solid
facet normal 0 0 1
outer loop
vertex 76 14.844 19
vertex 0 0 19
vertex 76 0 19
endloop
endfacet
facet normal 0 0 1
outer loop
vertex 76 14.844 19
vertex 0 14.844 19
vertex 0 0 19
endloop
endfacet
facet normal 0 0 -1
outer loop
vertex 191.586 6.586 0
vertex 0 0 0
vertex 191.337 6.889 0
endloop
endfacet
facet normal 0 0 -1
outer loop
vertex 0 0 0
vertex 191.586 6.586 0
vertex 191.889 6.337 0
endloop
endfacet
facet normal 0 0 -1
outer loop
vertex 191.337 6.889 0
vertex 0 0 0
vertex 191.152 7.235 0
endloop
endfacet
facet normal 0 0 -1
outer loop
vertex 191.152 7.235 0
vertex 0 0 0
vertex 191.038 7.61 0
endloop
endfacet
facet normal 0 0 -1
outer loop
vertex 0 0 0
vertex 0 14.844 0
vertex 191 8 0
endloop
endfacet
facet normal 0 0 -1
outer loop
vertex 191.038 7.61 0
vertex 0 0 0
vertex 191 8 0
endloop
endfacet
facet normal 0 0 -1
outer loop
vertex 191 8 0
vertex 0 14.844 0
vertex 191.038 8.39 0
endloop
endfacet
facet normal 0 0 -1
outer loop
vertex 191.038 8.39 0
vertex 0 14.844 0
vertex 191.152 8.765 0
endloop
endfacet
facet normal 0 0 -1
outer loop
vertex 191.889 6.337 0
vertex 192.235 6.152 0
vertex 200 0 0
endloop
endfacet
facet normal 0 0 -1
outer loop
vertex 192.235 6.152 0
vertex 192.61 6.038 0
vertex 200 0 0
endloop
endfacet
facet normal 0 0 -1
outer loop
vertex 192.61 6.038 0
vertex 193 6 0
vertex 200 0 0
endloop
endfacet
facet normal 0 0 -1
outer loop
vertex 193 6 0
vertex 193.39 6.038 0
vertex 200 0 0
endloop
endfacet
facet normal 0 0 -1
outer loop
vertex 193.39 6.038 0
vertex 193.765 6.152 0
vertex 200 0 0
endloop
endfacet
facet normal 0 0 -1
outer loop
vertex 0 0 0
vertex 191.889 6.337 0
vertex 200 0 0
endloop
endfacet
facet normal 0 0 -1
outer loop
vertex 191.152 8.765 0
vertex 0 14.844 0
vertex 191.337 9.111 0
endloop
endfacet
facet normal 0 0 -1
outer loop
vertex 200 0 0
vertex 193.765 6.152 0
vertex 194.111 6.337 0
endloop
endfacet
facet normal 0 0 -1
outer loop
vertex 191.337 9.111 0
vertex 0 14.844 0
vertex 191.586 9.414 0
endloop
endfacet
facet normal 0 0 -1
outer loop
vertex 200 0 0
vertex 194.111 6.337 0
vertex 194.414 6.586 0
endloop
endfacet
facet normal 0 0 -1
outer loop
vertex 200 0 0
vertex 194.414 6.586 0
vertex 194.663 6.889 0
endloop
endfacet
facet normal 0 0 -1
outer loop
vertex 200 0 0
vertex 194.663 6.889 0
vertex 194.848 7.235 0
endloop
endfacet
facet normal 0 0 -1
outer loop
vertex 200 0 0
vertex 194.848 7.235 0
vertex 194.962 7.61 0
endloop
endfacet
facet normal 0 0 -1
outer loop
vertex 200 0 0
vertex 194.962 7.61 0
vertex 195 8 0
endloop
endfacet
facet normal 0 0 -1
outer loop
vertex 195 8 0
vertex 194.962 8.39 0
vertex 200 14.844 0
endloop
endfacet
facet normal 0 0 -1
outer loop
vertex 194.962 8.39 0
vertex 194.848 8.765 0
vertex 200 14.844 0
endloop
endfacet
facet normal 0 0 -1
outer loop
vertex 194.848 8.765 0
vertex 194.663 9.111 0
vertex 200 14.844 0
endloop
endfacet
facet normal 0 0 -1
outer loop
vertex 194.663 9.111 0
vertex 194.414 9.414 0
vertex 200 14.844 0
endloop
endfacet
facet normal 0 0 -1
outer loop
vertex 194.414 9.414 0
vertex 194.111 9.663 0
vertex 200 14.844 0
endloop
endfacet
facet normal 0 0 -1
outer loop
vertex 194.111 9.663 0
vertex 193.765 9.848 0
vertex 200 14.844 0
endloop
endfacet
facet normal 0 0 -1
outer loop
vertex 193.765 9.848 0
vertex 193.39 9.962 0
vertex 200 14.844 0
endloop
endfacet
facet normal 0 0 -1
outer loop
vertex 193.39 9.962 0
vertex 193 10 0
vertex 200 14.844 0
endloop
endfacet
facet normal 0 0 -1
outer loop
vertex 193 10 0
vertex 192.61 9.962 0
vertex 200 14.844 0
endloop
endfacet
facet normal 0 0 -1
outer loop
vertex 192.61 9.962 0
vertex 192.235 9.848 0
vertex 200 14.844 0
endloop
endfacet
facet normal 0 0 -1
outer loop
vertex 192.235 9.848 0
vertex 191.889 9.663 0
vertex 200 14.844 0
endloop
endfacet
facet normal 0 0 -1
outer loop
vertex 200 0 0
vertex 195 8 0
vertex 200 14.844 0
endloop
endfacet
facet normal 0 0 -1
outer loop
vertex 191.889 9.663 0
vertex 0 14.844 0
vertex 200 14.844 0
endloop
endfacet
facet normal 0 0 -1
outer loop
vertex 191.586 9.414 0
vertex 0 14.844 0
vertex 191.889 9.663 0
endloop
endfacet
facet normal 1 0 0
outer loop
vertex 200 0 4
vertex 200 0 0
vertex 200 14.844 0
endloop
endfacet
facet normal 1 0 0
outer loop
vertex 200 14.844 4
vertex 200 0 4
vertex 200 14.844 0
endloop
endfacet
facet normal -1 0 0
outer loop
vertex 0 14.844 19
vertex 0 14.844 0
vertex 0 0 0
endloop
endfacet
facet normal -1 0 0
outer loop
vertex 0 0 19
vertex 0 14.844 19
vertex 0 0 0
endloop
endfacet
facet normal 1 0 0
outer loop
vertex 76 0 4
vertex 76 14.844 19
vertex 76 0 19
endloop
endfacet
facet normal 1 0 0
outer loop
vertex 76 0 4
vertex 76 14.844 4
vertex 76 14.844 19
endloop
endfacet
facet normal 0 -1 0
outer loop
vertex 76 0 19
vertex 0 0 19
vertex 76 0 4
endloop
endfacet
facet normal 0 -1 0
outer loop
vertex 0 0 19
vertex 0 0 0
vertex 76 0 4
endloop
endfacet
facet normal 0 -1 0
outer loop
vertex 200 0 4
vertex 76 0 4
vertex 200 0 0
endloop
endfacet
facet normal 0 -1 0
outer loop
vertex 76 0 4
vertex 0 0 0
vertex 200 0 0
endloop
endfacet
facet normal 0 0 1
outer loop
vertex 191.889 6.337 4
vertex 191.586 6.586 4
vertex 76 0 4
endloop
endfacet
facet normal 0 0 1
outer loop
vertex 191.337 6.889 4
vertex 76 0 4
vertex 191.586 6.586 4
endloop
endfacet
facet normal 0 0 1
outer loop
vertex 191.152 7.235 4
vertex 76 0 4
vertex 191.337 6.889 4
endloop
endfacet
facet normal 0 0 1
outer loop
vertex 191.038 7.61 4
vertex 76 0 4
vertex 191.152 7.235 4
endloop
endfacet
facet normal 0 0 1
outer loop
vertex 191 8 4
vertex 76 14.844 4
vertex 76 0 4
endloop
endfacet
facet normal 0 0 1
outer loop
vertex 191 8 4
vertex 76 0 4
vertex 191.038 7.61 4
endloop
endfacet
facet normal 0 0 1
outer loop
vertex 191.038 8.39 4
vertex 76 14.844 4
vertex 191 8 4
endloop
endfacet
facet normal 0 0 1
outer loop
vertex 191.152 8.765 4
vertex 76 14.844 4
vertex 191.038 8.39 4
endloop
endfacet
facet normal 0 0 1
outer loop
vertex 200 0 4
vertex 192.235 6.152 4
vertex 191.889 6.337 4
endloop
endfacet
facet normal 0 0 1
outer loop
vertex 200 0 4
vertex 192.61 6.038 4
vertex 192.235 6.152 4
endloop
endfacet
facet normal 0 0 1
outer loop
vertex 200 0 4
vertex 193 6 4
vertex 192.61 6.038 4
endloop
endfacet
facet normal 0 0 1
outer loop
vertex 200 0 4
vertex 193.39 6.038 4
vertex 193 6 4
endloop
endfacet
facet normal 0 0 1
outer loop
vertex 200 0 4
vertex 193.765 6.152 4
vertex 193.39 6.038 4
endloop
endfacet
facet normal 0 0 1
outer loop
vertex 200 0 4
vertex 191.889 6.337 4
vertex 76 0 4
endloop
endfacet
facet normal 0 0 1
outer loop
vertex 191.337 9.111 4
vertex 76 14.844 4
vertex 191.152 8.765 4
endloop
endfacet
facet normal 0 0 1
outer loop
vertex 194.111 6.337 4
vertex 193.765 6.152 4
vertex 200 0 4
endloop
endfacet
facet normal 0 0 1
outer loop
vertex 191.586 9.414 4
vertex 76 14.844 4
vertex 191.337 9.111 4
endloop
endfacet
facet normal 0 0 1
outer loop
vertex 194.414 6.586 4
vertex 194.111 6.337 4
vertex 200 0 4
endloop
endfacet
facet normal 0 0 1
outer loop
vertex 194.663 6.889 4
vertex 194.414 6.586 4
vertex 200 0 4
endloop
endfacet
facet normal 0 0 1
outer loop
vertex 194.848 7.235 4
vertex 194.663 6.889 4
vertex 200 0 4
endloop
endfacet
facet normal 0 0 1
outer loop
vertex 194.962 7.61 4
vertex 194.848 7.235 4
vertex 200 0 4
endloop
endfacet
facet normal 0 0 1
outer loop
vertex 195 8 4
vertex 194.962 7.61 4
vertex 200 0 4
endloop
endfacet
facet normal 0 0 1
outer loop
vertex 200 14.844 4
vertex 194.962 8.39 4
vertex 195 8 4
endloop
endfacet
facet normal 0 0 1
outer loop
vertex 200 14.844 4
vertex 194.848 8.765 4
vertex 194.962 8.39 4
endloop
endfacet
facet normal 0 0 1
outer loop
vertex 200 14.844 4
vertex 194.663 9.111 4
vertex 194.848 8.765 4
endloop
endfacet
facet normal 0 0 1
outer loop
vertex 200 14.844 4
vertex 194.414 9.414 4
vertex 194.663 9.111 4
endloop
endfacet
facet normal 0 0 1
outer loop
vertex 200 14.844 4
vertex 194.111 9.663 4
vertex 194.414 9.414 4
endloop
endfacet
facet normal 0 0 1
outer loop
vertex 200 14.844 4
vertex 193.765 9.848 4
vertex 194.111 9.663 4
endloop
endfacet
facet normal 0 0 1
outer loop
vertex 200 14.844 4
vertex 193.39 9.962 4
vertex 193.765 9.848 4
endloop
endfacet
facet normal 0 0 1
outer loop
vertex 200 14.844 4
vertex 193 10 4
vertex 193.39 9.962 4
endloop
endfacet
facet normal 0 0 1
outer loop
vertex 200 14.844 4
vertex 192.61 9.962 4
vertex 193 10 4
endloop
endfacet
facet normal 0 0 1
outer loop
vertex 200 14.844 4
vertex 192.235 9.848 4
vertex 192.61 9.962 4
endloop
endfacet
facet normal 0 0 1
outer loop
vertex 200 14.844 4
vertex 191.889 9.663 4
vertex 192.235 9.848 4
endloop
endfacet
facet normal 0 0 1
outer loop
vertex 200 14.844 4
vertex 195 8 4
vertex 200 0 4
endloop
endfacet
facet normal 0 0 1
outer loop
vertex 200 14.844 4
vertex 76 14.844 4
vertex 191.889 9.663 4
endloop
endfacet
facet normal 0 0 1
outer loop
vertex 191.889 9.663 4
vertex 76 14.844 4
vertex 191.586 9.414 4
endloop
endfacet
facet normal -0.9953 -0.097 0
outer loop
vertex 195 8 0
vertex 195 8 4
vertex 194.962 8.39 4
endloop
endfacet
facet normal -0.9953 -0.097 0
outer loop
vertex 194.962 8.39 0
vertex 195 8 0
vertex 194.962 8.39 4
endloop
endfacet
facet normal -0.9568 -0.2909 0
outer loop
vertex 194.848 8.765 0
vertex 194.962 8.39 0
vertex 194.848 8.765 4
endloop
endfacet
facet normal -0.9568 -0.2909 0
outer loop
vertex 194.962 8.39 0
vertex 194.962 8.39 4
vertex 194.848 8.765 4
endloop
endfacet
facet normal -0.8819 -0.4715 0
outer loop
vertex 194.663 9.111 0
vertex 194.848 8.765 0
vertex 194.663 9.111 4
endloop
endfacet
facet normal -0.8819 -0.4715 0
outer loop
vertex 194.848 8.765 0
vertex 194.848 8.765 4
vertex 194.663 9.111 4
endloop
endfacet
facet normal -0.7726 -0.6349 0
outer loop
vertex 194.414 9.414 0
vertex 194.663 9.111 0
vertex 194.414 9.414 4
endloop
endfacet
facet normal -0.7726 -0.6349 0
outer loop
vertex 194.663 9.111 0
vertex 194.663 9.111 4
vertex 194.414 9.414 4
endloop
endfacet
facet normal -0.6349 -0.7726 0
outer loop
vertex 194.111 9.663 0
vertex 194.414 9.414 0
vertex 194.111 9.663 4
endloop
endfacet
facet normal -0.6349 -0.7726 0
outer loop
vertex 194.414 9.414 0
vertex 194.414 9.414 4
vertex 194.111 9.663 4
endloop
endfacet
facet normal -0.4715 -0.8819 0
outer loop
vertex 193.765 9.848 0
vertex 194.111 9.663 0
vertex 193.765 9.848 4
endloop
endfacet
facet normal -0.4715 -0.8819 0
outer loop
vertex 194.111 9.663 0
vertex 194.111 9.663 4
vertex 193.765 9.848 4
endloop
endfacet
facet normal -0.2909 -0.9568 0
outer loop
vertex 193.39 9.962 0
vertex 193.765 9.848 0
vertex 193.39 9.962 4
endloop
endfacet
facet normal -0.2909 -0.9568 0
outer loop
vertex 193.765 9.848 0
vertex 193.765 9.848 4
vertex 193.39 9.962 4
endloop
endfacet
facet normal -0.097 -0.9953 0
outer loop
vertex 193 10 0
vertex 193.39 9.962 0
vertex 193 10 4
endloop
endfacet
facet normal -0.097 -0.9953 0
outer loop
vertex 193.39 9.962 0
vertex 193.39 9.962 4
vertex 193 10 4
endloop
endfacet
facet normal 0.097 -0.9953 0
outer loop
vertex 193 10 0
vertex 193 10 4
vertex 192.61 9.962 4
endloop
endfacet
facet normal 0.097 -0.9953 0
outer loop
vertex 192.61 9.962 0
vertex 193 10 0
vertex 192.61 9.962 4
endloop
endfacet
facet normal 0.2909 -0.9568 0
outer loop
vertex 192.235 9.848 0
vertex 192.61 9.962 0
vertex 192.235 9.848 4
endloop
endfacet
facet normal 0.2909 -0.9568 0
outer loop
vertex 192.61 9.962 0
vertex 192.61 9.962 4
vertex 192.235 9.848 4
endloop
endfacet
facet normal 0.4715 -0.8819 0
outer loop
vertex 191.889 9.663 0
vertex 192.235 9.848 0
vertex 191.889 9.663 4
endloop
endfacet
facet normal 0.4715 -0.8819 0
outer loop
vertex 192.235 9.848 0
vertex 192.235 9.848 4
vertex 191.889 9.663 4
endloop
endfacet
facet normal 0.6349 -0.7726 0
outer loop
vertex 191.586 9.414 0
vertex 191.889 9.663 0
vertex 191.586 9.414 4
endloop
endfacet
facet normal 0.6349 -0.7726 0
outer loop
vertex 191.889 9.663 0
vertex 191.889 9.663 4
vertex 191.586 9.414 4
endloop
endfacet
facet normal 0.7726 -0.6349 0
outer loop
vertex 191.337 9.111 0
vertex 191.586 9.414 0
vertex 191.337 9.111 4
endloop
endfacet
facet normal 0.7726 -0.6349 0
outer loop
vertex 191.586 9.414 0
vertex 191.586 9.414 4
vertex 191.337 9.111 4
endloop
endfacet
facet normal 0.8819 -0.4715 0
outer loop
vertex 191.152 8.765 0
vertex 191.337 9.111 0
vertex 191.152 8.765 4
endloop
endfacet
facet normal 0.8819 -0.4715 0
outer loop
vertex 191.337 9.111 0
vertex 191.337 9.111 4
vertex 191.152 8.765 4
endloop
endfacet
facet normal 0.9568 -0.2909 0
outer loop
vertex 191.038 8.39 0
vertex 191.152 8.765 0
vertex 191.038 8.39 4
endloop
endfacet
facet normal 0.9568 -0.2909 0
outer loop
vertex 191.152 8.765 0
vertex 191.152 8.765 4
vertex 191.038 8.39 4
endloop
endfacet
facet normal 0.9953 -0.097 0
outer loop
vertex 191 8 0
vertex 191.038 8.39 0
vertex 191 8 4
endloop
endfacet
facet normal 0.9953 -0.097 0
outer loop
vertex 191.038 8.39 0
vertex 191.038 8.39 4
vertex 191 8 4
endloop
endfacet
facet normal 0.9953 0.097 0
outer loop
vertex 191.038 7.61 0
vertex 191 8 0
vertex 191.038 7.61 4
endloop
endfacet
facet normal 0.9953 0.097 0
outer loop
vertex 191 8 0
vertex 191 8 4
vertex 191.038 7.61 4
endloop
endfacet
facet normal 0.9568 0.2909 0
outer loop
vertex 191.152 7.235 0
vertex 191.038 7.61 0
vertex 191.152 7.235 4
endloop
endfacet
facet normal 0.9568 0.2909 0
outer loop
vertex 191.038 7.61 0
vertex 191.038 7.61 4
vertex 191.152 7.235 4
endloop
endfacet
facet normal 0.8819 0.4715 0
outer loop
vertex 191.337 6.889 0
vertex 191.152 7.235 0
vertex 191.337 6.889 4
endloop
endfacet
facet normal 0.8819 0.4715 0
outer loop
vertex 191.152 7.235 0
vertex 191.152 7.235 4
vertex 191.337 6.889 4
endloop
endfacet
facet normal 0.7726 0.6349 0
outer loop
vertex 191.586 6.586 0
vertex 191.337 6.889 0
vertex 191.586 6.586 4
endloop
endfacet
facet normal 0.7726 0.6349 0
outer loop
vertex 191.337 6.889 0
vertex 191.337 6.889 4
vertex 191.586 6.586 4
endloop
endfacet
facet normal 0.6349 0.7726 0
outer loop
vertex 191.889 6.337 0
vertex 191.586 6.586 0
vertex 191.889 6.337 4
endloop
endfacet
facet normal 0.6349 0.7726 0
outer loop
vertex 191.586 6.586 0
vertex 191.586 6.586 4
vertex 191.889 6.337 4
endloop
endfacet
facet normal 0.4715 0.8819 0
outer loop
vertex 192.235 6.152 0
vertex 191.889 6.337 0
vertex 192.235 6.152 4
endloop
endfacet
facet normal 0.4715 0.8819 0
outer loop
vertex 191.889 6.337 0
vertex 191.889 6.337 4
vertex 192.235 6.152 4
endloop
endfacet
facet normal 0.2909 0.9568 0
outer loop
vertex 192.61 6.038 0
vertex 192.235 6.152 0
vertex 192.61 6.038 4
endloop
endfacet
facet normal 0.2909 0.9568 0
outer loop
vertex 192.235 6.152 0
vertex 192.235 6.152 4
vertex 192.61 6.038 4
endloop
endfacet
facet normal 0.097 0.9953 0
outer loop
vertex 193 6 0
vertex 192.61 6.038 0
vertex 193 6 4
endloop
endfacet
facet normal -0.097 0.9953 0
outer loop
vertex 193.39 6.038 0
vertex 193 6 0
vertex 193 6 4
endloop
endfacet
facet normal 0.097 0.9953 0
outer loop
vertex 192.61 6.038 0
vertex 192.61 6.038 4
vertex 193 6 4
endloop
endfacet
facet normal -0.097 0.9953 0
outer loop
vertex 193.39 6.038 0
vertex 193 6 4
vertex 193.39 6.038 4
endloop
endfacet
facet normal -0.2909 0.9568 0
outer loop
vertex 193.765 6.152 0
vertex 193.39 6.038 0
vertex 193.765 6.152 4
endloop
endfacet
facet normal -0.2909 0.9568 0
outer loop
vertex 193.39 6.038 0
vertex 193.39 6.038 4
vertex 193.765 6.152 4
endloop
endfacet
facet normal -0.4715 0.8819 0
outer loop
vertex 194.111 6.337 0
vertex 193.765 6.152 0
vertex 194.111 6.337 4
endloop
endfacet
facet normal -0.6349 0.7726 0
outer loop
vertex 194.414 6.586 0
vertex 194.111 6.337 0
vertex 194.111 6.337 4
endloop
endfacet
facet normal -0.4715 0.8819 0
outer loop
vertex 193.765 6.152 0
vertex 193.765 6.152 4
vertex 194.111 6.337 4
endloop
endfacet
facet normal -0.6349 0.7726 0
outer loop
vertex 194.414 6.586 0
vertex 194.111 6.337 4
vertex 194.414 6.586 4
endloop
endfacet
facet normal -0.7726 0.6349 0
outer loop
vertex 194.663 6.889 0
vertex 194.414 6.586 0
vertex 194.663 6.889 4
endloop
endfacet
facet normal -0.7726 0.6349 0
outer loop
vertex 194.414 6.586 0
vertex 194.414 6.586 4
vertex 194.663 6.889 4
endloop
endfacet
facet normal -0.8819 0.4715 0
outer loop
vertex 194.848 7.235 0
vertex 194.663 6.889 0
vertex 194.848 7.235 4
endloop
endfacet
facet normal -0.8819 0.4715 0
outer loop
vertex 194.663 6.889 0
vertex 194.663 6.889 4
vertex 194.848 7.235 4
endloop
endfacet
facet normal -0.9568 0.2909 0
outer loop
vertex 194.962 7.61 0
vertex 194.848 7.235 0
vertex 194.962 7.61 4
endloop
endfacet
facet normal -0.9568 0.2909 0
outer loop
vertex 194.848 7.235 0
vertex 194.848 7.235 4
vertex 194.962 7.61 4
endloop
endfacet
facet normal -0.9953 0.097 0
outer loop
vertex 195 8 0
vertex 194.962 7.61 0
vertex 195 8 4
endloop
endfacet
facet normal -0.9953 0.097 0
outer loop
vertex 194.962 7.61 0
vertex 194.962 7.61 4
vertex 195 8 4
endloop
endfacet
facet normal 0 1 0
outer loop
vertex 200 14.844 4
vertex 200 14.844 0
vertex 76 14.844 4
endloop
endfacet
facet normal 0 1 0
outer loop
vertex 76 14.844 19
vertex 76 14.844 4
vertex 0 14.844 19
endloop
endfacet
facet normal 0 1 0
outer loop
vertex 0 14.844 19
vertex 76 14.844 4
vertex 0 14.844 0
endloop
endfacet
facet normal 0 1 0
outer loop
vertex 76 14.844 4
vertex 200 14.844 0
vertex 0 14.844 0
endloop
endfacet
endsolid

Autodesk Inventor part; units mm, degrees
ref_plane "YZ Plane" through (0, 0, 0) normal (1, 0, 0) x (0, 1, 0)
ref_plane "XZ Plane" through (0, 0, 0) normal (0, 1, 0) x (-1, 0, 0)
ref_plane "XY Plane" through (0, 0, 0) normal (0, 0, 1) x (1, 0, 0)
sketch "Эскиз1" plane through (0, 0, 0) normal (0, 0, 1) x (1, 0, 0)
  line L0 (0, 0) -> (200, 0)
  line L1 (200, 0) -> (200, 14.8438)
  line L2 (200, 14.8438) -> (0, 14.8438)
  line L3 (0, 14.8438) -> (0, 0)
  dimension "d2" = 200
extrude "Выдавливание1" add sketch "Эскиз1" along normal blind 4
sketch "Эскиз2" plane through (0, 0, 4) normal (0, 0, 1) x (1, 0, 0)
  line L0 (200, 14.8438) -> (0, 14.8438) projected
  line L1 (0, 0) -> (200, 0) projected
  line L2 (0, 14.8438) -> (76, 14.8438)
  line L3 (76, 14.8438) -> (76, 0)
  line L4 (76, 0) -> (0, 0)
  line L5 (0, 0) -> (0, 14.8438)
extrude "Выдавливание2" add sketch "Эскиз2" along normal blind 15
sketch "Эскиз3" plane through (0, 0, 4) normal (0, 0, 1) x (1, 0, 0)
  circle A0 centre (193, 8) radius 2
  point P0 (0, 0)
  dimension "d5" = 4
extrude "Выдавливание3" cut sketch "Эскиз3" against normal blind 10
properties part number "ведро 2 гол"
